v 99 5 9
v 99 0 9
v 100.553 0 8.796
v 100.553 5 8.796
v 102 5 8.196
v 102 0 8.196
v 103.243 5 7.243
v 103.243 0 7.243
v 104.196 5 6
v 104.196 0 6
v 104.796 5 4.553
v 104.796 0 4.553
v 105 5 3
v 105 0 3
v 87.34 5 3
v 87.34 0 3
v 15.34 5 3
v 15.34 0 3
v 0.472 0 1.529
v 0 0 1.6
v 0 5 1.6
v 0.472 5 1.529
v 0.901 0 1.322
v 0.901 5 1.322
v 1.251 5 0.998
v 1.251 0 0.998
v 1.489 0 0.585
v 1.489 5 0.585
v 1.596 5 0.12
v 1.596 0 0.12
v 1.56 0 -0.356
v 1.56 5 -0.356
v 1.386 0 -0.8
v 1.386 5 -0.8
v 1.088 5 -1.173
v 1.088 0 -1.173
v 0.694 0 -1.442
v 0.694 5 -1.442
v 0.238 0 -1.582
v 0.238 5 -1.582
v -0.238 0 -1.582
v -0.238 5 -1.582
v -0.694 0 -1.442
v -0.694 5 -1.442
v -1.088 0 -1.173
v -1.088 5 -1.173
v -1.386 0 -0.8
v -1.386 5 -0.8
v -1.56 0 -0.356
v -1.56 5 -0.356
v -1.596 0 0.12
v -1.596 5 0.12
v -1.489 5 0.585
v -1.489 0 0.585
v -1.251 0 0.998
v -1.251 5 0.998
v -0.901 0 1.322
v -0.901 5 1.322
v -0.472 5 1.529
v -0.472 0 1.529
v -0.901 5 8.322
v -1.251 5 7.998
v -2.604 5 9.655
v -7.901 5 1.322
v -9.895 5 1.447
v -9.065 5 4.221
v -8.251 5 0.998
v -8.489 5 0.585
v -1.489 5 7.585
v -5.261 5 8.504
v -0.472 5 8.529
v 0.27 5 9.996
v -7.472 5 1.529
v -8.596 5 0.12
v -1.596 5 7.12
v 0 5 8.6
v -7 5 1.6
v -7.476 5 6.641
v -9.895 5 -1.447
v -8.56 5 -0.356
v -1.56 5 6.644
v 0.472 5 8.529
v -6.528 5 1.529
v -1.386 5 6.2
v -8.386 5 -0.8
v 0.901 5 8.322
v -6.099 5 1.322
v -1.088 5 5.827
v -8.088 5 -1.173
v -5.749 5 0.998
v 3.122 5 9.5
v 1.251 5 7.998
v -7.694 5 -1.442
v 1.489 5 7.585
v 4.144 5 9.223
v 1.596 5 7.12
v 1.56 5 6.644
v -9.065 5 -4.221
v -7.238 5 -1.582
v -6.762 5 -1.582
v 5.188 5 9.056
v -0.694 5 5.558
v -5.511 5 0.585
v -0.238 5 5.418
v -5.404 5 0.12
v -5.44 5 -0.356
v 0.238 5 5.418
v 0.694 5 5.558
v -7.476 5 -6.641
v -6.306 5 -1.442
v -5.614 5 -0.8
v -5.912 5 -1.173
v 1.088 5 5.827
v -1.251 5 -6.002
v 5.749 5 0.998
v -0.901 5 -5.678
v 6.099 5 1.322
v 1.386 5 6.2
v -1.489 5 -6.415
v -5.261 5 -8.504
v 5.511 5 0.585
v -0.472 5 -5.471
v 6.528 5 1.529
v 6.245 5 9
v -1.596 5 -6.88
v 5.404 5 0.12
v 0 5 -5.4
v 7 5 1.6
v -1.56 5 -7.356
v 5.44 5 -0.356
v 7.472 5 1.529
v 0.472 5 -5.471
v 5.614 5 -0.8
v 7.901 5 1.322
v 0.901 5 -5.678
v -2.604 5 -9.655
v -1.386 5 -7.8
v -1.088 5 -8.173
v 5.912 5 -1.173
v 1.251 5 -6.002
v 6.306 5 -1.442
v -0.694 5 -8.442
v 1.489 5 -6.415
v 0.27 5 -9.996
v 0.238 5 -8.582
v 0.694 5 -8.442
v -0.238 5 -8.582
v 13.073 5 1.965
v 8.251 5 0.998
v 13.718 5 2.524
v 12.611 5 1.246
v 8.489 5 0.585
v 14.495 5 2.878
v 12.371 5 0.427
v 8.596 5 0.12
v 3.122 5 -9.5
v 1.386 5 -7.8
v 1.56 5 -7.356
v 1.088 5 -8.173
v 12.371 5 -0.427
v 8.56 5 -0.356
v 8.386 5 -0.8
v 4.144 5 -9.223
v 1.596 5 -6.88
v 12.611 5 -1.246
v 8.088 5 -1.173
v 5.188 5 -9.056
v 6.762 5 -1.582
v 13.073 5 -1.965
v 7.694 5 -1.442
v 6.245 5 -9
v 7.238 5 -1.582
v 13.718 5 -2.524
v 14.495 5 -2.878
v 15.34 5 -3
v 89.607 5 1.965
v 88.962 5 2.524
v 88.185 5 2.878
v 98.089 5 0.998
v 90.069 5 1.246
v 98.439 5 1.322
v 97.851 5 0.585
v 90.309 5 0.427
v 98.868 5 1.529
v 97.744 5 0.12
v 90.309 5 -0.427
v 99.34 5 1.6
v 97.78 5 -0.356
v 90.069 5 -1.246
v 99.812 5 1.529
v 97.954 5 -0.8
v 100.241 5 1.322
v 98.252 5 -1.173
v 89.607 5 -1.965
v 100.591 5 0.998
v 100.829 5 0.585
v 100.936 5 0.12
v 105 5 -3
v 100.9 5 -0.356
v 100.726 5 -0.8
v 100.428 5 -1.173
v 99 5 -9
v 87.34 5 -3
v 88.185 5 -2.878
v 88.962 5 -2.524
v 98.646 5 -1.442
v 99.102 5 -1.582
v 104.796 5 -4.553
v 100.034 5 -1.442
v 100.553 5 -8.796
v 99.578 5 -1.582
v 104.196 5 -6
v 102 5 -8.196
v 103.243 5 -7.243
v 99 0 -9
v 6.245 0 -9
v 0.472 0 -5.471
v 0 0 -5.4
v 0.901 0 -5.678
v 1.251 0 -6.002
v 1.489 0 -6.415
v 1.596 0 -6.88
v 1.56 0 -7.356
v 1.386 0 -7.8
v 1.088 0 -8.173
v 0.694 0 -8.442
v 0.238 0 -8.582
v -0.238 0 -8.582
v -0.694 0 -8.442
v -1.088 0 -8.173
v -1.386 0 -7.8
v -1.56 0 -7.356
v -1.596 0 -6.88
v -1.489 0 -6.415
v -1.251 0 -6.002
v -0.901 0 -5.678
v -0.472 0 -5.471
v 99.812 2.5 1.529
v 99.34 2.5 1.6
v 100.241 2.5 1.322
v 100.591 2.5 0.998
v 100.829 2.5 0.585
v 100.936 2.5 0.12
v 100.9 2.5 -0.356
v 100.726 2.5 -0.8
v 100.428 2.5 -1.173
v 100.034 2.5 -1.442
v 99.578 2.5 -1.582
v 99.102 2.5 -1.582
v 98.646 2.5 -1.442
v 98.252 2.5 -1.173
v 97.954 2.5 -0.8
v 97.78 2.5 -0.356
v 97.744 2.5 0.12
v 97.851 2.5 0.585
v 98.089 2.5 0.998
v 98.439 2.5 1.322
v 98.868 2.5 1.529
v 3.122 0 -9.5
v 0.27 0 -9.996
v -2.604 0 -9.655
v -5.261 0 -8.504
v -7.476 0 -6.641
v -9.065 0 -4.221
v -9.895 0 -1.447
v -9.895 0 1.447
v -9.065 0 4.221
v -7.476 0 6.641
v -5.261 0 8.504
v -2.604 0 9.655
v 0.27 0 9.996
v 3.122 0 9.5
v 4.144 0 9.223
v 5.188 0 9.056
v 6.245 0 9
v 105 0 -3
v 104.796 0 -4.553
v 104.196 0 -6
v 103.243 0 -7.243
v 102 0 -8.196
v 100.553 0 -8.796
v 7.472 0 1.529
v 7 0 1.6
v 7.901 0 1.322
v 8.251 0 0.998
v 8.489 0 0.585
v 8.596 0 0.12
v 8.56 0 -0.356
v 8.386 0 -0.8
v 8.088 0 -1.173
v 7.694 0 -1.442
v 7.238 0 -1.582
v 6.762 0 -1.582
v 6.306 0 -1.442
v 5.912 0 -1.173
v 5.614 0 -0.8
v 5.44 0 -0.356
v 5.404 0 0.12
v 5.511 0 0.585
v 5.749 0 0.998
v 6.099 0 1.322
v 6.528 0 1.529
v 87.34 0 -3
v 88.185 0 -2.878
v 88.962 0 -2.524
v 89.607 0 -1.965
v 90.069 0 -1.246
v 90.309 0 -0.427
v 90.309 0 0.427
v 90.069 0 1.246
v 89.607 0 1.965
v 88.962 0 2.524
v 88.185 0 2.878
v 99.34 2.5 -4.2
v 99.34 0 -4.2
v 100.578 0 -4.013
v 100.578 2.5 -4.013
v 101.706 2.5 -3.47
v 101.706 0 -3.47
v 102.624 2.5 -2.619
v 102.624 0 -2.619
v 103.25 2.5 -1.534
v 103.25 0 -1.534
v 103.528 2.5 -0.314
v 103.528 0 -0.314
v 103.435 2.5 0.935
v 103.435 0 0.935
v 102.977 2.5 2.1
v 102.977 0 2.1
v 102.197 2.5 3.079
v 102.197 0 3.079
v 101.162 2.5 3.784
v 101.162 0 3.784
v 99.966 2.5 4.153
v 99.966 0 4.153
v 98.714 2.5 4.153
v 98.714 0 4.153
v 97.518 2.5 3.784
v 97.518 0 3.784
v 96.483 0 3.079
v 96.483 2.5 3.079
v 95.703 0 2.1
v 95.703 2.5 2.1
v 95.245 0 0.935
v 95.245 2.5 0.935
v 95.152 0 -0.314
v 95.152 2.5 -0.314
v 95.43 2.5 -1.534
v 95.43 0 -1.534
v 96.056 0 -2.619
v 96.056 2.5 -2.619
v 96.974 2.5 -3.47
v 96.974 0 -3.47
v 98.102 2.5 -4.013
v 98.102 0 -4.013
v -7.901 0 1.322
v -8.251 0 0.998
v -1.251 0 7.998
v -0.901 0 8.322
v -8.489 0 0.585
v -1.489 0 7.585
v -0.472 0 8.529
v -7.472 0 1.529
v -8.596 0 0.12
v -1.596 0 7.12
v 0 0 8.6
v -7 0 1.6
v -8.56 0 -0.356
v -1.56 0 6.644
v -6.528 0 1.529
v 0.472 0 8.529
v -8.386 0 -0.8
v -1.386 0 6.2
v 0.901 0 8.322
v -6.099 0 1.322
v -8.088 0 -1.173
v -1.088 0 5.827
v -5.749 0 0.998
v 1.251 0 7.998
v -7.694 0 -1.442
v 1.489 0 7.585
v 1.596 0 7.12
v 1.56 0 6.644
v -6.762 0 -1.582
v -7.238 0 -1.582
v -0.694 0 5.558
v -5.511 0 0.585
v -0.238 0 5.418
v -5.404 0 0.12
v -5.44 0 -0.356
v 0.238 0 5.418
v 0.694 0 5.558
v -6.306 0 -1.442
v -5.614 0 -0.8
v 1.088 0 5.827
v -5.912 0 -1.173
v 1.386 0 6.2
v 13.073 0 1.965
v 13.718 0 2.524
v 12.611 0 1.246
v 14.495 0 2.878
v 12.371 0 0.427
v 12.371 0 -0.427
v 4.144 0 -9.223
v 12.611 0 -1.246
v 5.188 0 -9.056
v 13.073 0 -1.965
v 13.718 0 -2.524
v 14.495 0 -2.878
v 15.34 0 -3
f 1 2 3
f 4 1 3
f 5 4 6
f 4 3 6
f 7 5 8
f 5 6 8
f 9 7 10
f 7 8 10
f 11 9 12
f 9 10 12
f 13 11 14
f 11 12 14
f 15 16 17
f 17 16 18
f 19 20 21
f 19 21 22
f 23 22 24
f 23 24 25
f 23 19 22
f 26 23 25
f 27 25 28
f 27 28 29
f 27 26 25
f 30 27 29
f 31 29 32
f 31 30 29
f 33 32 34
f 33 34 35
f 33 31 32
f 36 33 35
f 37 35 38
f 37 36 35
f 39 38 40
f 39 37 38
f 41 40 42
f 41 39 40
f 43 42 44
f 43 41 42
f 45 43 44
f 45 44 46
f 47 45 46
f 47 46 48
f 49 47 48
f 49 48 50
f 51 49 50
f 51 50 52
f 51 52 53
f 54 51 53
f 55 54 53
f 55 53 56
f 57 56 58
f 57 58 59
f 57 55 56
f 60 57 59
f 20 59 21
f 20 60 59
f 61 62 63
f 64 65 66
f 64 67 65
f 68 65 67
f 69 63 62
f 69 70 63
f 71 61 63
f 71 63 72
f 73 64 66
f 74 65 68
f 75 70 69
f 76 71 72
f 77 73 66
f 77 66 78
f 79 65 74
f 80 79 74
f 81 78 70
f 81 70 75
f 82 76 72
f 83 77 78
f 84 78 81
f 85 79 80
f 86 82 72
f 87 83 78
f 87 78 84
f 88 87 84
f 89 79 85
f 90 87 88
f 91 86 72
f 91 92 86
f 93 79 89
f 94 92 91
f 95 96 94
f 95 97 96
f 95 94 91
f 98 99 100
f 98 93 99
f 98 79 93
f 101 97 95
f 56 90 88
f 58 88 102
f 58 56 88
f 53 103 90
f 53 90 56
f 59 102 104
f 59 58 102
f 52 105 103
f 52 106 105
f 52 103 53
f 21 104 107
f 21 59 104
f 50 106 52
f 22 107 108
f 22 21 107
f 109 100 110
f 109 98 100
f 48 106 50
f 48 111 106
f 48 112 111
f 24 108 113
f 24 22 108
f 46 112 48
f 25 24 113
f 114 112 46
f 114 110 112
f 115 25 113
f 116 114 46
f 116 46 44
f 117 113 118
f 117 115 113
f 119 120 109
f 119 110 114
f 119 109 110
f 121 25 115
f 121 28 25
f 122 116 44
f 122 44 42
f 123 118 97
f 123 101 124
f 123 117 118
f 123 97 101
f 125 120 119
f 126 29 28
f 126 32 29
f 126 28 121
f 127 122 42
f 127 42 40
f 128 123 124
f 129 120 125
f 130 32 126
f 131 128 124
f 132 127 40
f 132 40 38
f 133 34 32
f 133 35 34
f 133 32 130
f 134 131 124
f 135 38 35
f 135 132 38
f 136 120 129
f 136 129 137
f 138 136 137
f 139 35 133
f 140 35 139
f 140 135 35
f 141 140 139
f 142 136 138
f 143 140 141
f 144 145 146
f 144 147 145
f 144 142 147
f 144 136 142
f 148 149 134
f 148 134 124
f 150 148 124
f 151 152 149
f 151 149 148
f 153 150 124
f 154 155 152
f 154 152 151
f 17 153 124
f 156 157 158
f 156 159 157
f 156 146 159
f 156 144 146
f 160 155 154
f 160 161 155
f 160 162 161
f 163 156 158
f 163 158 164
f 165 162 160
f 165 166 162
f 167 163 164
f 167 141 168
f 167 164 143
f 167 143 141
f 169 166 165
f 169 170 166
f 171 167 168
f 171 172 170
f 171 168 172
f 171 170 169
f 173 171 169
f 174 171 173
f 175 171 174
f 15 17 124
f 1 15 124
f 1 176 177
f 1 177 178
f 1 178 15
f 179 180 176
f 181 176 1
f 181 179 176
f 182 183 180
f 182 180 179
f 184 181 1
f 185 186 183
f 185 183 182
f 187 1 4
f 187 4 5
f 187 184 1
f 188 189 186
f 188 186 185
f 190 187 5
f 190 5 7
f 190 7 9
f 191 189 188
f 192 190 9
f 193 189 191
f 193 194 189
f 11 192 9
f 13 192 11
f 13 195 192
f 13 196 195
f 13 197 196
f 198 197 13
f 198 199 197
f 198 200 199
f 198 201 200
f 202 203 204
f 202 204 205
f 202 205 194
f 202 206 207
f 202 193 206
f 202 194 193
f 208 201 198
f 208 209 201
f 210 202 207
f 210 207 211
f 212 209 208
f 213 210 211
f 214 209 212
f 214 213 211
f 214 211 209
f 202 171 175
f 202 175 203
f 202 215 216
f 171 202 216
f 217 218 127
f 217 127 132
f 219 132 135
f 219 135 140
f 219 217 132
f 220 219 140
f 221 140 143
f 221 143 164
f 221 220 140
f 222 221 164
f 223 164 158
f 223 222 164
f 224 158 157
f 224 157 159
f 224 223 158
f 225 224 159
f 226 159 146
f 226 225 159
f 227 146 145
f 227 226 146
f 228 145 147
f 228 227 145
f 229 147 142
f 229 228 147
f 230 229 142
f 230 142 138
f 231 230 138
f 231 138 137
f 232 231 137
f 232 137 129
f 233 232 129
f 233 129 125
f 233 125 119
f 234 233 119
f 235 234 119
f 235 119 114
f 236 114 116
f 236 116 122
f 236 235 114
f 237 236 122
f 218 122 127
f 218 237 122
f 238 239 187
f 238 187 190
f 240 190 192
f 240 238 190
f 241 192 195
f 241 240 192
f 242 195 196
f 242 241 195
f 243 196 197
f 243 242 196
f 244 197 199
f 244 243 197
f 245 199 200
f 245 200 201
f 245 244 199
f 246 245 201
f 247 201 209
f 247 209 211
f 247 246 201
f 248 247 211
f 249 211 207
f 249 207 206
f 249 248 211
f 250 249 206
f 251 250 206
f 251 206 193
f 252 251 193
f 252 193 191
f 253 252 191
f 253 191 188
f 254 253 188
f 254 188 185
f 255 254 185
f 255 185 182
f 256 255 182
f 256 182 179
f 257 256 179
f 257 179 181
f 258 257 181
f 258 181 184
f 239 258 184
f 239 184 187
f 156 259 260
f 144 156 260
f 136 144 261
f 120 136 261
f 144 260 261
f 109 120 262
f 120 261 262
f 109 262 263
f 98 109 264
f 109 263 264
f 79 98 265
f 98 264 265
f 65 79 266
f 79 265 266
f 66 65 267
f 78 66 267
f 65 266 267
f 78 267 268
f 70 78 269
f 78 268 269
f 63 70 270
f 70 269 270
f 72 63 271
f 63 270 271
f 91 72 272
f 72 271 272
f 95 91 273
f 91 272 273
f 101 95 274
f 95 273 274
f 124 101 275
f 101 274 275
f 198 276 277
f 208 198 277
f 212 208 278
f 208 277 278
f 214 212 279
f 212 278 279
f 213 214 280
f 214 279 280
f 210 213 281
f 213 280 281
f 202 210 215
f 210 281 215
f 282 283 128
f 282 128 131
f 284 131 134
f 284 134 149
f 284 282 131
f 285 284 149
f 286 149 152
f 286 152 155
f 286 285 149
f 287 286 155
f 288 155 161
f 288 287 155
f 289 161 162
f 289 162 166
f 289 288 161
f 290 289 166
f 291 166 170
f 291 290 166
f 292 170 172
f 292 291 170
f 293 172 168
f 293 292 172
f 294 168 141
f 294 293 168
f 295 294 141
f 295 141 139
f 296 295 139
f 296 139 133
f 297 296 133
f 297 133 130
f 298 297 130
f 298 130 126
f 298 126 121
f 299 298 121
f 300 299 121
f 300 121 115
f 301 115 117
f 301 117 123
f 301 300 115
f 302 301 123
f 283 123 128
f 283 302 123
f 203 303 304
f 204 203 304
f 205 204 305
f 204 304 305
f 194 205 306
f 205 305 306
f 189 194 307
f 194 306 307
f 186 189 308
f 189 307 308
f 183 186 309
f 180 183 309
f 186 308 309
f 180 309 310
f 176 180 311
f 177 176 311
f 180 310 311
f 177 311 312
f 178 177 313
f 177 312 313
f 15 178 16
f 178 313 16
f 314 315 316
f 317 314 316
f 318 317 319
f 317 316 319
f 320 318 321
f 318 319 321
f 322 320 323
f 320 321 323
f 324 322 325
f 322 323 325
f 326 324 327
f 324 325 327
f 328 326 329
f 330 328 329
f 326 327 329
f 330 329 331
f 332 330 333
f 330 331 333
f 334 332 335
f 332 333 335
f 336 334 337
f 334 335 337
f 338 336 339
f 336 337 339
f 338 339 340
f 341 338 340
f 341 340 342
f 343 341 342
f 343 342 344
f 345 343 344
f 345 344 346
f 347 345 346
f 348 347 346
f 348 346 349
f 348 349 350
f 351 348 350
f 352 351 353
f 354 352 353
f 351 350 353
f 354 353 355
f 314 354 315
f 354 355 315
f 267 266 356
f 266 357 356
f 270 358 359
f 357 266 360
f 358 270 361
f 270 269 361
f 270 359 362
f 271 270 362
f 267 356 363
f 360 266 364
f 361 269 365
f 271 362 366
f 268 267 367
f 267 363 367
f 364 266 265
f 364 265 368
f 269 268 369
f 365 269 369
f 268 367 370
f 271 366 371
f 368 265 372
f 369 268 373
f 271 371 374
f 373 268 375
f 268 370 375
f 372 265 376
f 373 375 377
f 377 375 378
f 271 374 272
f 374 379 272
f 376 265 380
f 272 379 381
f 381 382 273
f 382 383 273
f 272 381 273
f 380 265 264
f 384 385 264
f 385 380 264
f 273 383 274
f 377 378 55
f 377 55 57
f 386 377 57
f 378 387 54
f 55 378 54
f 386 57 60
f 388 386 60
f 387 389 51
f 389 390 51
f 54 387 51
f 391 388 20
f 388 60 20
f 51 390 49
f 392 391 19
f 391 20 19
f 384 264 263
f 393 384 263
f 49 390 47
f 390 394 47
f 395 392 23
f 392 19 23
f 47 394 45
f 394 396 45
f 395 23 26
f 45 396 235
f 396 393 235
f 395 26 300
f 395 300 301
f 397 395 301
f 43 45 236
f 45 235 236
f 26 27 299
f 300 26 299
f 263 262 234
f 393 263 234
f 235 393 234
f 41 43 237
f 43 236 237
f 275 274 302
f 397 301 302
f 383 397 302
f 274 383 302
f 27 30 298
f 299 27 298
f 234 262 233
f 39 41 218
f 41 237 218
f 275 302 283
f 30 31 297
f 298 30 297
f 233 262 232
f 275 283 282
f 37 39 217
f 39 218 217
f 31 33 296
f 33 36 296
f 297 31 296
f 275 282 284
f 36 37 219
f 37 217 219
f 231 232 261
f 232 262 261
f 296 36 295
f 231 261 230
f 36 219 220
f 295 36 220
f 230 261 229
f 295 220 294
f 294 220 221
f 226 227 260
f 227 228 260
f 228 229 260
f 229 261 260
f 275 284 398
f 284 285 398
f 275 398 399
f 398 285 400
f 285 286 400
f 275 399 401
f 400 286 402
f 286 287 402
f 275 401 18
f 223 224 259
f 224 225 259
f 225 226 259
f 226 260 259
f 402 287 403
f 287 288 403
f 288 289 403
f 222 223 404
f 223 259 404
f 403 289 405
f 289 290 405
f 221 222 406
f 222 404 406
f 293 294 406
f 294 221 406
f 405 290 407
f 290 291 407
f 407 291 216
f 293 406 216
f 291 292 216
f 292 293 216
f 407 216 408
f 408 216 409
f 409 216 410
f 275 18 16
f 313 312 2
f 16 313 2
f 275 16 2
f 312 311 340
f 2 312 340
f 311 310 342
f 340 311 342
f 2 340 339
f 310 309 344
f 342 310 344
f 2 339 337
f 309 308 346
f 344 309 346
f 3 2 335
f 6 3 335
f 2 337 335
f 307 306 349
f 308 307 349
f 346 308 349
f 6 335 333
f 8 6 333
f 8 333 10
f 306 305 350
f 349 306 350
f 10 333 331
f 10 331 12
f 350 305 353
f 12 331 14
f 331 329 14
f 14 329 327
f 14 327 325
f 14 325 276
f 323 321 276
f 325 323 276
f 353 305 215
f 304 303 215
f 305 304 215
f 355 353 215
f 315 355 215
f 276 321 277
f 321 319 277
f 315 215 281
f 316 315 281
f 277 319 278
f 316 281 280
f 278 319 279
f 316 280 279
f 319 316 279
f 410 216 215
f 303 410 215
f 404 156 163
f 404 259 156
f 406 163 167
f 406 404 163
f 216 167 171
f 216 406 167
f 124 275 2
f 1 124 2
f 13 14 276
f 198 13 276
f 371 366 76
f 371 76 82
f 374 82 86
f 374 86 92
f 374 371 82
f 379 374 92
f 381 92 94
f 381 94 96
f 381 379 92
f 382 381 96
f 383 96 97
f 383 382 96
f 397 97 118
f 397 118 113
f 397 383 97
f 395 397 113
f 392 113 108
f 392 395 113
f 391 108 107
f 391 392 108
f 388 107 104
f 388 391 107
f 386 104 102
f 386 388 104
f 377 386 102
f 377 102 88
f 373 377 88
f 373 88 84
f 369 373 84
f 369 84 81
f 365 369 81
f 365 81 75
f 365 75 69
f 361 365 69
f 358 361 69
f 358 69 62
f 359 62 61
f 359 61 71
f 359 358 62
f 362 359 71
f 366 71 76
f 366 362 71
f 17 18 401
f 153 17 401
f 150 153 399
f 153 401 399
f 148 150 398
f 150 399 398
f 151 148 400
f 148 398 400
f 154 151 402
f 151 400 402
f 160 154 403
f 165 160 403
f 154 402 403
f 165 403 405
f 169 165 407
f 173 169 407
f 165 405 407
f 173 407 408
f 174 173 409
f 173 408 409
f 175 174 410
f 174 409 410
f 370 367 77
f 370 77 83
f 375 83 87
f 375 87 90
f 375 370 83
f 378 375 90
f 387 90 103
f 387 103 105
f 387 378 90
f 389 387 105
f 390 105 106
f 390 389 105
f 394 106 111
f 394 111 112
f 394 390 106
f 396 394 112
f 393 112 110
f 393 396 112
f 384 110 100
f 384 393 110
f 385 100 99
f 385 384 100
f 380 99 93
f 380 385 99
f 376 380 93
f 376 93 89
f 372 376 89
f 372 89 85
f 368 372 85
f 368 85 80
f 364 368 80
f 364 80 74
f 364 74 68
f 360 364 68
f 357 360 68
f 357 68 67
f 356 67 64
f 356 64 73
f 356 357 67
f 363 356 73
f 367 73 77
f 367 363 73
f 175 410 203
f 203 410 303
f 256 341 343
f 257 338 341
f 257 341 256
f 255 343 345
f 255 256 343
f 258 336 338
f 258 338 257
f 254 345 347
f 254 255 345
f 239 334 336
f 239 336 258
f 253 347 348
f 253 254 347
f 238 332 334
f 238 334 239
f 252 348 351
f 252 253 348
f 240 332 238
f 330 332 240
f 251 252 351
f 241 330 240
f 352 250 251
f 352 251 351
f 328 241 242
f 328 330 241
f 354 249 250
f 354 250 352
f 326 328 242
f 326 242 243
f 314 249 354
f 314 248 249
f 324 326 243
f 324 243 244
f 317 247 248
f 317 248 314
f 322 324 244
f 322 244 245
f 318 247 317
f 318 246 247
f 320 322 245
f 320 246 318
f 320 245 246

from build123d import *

# Parameters (mm, degrees)
SKETCH_1_R          = 1.6
SKETCH_1_R_2        = 9
EXTRUDE_1_DEPTH     = 5
SKETCH_2_R          = 4.2
CUT_EXTRUDE_1_DEPTH = 2.5
EXTRUDE_START       = -5
SKETCH_3_R          = 10
SKETCH_3_R_2        = 9
EXTRUDE_2_DEPTH     = 5
FILLET_1_R          = 10


with BuildPart() as part:
    # 草图1 → 凸台-拉伸1 (new body)
    # profile 1 of 2: a face of its own
    with BuildSketch(Plane(origin=(0, 0, 0), x_dir=(1, 0, 0), z_dir=(0, 1, 0))):
        with BuildLine():
            Line((99, 9), (0, 9))
            ThreePointArc((0, 9), (6.363961031, 6.363961031), (9, 0))
            ThreePointArc((9, 0), (6.363961031, -6.363961031), (0, -9))
            Line((0, -9), (99, -9))
            ThreePointArc((99, -9), (103.242640687, -7.242640687), (105, -3))
            Line((105, -3), (105, 3))
            ThreePointArc((105, 3), (103.242640687, 7.242640687), (99, 9))
        make_face()
        with BuildLine():
            ThreePointArc((15.34, -3), (12.34, 0), (15.34, 3))
            Line((15.34, 3), (87.34, 3))
            ThreePointArc((87.34, 3), (90.34, 0), (87.34, -3))
            Line((87.34, -3), (15.34, -3))
        make_face(mode=Mode.SUBTRACT)
        with Locations(Location((99.34, 0, 0), (0, 0, 270))):
            Circle(SKETCH_1_R, mode=Mode.SUBTRACT)
    # profile 2 of 2: a face of its own
    with BuildSketch(Plane(origin=(0, 0, 0), x_dir=(1, 0, 0), z_dir=(0, 1, 0))):
        Circle(SKETCH_1_R_2)
        with Locations(Location((0, -7, 0), (0, 0, 270))):
            Circle(SKETCH_1_R, mode=Mode.SUBTRACT)
        with Locations(Location((7, 0, 0), (0, 0, 270))):
            Circle(SKETCH_1_R, mode=Mode.SUBTRACT)
        with Locations(Location((0, 7, 0), (0, 0, 270))):
            Circle(SKETCH_1_R, mode=Mode.SUBTRACT)
        with Locations(Location((-7, 0, 0), (0, 0, 270))):
            Circle(SKETCH_1_R, mode=Mode.SUBTRACT)
        with Locations(Location((0, 0, 0), (0, 0, 270))):
            Circle(SKETCH_1_R, mode=Mode.SUBTRACT)
    extrude(amount=EXTRUDE_1_DEPTH)

    # 草图2 → 切除-拉伸1 (cut)
    with BuildSketch(Plane.XZ):
        with Locations(Location((99.34, 0, 0), (0, 0, 270))):
            Circle(SKETCH_2_R)
    extrude(amount=-CUT_EXTRUDE_1_DEPTH, mode=Mode.SUBTRACT)

    # 草图3 → 凸台-拉伸2 (add)
    with BuildSketch(Plane(origin=(0, 5, 0), x_dir=(1, 0, 0), z_dir=(0, 1, 0)).offset(EXTRUDE_START)):
        Circle(SKETCH_3_R)
        Circle(SKETCH_3_R_2, mode=Mode.SUBTRACT)
    extrude(amount=EXTRUDE_2_DEPTH)

    # 圆角1
    fillet_1_edges = [part.edges().sort_by_distance(p)[0] for p in [
        (4.358898944, 2.5, -9),
        (4.358898944, 2.5, 9),
    ]]
    fillet(fillet_1_edges, radius=FILLET_1_R)


solid = part.part
